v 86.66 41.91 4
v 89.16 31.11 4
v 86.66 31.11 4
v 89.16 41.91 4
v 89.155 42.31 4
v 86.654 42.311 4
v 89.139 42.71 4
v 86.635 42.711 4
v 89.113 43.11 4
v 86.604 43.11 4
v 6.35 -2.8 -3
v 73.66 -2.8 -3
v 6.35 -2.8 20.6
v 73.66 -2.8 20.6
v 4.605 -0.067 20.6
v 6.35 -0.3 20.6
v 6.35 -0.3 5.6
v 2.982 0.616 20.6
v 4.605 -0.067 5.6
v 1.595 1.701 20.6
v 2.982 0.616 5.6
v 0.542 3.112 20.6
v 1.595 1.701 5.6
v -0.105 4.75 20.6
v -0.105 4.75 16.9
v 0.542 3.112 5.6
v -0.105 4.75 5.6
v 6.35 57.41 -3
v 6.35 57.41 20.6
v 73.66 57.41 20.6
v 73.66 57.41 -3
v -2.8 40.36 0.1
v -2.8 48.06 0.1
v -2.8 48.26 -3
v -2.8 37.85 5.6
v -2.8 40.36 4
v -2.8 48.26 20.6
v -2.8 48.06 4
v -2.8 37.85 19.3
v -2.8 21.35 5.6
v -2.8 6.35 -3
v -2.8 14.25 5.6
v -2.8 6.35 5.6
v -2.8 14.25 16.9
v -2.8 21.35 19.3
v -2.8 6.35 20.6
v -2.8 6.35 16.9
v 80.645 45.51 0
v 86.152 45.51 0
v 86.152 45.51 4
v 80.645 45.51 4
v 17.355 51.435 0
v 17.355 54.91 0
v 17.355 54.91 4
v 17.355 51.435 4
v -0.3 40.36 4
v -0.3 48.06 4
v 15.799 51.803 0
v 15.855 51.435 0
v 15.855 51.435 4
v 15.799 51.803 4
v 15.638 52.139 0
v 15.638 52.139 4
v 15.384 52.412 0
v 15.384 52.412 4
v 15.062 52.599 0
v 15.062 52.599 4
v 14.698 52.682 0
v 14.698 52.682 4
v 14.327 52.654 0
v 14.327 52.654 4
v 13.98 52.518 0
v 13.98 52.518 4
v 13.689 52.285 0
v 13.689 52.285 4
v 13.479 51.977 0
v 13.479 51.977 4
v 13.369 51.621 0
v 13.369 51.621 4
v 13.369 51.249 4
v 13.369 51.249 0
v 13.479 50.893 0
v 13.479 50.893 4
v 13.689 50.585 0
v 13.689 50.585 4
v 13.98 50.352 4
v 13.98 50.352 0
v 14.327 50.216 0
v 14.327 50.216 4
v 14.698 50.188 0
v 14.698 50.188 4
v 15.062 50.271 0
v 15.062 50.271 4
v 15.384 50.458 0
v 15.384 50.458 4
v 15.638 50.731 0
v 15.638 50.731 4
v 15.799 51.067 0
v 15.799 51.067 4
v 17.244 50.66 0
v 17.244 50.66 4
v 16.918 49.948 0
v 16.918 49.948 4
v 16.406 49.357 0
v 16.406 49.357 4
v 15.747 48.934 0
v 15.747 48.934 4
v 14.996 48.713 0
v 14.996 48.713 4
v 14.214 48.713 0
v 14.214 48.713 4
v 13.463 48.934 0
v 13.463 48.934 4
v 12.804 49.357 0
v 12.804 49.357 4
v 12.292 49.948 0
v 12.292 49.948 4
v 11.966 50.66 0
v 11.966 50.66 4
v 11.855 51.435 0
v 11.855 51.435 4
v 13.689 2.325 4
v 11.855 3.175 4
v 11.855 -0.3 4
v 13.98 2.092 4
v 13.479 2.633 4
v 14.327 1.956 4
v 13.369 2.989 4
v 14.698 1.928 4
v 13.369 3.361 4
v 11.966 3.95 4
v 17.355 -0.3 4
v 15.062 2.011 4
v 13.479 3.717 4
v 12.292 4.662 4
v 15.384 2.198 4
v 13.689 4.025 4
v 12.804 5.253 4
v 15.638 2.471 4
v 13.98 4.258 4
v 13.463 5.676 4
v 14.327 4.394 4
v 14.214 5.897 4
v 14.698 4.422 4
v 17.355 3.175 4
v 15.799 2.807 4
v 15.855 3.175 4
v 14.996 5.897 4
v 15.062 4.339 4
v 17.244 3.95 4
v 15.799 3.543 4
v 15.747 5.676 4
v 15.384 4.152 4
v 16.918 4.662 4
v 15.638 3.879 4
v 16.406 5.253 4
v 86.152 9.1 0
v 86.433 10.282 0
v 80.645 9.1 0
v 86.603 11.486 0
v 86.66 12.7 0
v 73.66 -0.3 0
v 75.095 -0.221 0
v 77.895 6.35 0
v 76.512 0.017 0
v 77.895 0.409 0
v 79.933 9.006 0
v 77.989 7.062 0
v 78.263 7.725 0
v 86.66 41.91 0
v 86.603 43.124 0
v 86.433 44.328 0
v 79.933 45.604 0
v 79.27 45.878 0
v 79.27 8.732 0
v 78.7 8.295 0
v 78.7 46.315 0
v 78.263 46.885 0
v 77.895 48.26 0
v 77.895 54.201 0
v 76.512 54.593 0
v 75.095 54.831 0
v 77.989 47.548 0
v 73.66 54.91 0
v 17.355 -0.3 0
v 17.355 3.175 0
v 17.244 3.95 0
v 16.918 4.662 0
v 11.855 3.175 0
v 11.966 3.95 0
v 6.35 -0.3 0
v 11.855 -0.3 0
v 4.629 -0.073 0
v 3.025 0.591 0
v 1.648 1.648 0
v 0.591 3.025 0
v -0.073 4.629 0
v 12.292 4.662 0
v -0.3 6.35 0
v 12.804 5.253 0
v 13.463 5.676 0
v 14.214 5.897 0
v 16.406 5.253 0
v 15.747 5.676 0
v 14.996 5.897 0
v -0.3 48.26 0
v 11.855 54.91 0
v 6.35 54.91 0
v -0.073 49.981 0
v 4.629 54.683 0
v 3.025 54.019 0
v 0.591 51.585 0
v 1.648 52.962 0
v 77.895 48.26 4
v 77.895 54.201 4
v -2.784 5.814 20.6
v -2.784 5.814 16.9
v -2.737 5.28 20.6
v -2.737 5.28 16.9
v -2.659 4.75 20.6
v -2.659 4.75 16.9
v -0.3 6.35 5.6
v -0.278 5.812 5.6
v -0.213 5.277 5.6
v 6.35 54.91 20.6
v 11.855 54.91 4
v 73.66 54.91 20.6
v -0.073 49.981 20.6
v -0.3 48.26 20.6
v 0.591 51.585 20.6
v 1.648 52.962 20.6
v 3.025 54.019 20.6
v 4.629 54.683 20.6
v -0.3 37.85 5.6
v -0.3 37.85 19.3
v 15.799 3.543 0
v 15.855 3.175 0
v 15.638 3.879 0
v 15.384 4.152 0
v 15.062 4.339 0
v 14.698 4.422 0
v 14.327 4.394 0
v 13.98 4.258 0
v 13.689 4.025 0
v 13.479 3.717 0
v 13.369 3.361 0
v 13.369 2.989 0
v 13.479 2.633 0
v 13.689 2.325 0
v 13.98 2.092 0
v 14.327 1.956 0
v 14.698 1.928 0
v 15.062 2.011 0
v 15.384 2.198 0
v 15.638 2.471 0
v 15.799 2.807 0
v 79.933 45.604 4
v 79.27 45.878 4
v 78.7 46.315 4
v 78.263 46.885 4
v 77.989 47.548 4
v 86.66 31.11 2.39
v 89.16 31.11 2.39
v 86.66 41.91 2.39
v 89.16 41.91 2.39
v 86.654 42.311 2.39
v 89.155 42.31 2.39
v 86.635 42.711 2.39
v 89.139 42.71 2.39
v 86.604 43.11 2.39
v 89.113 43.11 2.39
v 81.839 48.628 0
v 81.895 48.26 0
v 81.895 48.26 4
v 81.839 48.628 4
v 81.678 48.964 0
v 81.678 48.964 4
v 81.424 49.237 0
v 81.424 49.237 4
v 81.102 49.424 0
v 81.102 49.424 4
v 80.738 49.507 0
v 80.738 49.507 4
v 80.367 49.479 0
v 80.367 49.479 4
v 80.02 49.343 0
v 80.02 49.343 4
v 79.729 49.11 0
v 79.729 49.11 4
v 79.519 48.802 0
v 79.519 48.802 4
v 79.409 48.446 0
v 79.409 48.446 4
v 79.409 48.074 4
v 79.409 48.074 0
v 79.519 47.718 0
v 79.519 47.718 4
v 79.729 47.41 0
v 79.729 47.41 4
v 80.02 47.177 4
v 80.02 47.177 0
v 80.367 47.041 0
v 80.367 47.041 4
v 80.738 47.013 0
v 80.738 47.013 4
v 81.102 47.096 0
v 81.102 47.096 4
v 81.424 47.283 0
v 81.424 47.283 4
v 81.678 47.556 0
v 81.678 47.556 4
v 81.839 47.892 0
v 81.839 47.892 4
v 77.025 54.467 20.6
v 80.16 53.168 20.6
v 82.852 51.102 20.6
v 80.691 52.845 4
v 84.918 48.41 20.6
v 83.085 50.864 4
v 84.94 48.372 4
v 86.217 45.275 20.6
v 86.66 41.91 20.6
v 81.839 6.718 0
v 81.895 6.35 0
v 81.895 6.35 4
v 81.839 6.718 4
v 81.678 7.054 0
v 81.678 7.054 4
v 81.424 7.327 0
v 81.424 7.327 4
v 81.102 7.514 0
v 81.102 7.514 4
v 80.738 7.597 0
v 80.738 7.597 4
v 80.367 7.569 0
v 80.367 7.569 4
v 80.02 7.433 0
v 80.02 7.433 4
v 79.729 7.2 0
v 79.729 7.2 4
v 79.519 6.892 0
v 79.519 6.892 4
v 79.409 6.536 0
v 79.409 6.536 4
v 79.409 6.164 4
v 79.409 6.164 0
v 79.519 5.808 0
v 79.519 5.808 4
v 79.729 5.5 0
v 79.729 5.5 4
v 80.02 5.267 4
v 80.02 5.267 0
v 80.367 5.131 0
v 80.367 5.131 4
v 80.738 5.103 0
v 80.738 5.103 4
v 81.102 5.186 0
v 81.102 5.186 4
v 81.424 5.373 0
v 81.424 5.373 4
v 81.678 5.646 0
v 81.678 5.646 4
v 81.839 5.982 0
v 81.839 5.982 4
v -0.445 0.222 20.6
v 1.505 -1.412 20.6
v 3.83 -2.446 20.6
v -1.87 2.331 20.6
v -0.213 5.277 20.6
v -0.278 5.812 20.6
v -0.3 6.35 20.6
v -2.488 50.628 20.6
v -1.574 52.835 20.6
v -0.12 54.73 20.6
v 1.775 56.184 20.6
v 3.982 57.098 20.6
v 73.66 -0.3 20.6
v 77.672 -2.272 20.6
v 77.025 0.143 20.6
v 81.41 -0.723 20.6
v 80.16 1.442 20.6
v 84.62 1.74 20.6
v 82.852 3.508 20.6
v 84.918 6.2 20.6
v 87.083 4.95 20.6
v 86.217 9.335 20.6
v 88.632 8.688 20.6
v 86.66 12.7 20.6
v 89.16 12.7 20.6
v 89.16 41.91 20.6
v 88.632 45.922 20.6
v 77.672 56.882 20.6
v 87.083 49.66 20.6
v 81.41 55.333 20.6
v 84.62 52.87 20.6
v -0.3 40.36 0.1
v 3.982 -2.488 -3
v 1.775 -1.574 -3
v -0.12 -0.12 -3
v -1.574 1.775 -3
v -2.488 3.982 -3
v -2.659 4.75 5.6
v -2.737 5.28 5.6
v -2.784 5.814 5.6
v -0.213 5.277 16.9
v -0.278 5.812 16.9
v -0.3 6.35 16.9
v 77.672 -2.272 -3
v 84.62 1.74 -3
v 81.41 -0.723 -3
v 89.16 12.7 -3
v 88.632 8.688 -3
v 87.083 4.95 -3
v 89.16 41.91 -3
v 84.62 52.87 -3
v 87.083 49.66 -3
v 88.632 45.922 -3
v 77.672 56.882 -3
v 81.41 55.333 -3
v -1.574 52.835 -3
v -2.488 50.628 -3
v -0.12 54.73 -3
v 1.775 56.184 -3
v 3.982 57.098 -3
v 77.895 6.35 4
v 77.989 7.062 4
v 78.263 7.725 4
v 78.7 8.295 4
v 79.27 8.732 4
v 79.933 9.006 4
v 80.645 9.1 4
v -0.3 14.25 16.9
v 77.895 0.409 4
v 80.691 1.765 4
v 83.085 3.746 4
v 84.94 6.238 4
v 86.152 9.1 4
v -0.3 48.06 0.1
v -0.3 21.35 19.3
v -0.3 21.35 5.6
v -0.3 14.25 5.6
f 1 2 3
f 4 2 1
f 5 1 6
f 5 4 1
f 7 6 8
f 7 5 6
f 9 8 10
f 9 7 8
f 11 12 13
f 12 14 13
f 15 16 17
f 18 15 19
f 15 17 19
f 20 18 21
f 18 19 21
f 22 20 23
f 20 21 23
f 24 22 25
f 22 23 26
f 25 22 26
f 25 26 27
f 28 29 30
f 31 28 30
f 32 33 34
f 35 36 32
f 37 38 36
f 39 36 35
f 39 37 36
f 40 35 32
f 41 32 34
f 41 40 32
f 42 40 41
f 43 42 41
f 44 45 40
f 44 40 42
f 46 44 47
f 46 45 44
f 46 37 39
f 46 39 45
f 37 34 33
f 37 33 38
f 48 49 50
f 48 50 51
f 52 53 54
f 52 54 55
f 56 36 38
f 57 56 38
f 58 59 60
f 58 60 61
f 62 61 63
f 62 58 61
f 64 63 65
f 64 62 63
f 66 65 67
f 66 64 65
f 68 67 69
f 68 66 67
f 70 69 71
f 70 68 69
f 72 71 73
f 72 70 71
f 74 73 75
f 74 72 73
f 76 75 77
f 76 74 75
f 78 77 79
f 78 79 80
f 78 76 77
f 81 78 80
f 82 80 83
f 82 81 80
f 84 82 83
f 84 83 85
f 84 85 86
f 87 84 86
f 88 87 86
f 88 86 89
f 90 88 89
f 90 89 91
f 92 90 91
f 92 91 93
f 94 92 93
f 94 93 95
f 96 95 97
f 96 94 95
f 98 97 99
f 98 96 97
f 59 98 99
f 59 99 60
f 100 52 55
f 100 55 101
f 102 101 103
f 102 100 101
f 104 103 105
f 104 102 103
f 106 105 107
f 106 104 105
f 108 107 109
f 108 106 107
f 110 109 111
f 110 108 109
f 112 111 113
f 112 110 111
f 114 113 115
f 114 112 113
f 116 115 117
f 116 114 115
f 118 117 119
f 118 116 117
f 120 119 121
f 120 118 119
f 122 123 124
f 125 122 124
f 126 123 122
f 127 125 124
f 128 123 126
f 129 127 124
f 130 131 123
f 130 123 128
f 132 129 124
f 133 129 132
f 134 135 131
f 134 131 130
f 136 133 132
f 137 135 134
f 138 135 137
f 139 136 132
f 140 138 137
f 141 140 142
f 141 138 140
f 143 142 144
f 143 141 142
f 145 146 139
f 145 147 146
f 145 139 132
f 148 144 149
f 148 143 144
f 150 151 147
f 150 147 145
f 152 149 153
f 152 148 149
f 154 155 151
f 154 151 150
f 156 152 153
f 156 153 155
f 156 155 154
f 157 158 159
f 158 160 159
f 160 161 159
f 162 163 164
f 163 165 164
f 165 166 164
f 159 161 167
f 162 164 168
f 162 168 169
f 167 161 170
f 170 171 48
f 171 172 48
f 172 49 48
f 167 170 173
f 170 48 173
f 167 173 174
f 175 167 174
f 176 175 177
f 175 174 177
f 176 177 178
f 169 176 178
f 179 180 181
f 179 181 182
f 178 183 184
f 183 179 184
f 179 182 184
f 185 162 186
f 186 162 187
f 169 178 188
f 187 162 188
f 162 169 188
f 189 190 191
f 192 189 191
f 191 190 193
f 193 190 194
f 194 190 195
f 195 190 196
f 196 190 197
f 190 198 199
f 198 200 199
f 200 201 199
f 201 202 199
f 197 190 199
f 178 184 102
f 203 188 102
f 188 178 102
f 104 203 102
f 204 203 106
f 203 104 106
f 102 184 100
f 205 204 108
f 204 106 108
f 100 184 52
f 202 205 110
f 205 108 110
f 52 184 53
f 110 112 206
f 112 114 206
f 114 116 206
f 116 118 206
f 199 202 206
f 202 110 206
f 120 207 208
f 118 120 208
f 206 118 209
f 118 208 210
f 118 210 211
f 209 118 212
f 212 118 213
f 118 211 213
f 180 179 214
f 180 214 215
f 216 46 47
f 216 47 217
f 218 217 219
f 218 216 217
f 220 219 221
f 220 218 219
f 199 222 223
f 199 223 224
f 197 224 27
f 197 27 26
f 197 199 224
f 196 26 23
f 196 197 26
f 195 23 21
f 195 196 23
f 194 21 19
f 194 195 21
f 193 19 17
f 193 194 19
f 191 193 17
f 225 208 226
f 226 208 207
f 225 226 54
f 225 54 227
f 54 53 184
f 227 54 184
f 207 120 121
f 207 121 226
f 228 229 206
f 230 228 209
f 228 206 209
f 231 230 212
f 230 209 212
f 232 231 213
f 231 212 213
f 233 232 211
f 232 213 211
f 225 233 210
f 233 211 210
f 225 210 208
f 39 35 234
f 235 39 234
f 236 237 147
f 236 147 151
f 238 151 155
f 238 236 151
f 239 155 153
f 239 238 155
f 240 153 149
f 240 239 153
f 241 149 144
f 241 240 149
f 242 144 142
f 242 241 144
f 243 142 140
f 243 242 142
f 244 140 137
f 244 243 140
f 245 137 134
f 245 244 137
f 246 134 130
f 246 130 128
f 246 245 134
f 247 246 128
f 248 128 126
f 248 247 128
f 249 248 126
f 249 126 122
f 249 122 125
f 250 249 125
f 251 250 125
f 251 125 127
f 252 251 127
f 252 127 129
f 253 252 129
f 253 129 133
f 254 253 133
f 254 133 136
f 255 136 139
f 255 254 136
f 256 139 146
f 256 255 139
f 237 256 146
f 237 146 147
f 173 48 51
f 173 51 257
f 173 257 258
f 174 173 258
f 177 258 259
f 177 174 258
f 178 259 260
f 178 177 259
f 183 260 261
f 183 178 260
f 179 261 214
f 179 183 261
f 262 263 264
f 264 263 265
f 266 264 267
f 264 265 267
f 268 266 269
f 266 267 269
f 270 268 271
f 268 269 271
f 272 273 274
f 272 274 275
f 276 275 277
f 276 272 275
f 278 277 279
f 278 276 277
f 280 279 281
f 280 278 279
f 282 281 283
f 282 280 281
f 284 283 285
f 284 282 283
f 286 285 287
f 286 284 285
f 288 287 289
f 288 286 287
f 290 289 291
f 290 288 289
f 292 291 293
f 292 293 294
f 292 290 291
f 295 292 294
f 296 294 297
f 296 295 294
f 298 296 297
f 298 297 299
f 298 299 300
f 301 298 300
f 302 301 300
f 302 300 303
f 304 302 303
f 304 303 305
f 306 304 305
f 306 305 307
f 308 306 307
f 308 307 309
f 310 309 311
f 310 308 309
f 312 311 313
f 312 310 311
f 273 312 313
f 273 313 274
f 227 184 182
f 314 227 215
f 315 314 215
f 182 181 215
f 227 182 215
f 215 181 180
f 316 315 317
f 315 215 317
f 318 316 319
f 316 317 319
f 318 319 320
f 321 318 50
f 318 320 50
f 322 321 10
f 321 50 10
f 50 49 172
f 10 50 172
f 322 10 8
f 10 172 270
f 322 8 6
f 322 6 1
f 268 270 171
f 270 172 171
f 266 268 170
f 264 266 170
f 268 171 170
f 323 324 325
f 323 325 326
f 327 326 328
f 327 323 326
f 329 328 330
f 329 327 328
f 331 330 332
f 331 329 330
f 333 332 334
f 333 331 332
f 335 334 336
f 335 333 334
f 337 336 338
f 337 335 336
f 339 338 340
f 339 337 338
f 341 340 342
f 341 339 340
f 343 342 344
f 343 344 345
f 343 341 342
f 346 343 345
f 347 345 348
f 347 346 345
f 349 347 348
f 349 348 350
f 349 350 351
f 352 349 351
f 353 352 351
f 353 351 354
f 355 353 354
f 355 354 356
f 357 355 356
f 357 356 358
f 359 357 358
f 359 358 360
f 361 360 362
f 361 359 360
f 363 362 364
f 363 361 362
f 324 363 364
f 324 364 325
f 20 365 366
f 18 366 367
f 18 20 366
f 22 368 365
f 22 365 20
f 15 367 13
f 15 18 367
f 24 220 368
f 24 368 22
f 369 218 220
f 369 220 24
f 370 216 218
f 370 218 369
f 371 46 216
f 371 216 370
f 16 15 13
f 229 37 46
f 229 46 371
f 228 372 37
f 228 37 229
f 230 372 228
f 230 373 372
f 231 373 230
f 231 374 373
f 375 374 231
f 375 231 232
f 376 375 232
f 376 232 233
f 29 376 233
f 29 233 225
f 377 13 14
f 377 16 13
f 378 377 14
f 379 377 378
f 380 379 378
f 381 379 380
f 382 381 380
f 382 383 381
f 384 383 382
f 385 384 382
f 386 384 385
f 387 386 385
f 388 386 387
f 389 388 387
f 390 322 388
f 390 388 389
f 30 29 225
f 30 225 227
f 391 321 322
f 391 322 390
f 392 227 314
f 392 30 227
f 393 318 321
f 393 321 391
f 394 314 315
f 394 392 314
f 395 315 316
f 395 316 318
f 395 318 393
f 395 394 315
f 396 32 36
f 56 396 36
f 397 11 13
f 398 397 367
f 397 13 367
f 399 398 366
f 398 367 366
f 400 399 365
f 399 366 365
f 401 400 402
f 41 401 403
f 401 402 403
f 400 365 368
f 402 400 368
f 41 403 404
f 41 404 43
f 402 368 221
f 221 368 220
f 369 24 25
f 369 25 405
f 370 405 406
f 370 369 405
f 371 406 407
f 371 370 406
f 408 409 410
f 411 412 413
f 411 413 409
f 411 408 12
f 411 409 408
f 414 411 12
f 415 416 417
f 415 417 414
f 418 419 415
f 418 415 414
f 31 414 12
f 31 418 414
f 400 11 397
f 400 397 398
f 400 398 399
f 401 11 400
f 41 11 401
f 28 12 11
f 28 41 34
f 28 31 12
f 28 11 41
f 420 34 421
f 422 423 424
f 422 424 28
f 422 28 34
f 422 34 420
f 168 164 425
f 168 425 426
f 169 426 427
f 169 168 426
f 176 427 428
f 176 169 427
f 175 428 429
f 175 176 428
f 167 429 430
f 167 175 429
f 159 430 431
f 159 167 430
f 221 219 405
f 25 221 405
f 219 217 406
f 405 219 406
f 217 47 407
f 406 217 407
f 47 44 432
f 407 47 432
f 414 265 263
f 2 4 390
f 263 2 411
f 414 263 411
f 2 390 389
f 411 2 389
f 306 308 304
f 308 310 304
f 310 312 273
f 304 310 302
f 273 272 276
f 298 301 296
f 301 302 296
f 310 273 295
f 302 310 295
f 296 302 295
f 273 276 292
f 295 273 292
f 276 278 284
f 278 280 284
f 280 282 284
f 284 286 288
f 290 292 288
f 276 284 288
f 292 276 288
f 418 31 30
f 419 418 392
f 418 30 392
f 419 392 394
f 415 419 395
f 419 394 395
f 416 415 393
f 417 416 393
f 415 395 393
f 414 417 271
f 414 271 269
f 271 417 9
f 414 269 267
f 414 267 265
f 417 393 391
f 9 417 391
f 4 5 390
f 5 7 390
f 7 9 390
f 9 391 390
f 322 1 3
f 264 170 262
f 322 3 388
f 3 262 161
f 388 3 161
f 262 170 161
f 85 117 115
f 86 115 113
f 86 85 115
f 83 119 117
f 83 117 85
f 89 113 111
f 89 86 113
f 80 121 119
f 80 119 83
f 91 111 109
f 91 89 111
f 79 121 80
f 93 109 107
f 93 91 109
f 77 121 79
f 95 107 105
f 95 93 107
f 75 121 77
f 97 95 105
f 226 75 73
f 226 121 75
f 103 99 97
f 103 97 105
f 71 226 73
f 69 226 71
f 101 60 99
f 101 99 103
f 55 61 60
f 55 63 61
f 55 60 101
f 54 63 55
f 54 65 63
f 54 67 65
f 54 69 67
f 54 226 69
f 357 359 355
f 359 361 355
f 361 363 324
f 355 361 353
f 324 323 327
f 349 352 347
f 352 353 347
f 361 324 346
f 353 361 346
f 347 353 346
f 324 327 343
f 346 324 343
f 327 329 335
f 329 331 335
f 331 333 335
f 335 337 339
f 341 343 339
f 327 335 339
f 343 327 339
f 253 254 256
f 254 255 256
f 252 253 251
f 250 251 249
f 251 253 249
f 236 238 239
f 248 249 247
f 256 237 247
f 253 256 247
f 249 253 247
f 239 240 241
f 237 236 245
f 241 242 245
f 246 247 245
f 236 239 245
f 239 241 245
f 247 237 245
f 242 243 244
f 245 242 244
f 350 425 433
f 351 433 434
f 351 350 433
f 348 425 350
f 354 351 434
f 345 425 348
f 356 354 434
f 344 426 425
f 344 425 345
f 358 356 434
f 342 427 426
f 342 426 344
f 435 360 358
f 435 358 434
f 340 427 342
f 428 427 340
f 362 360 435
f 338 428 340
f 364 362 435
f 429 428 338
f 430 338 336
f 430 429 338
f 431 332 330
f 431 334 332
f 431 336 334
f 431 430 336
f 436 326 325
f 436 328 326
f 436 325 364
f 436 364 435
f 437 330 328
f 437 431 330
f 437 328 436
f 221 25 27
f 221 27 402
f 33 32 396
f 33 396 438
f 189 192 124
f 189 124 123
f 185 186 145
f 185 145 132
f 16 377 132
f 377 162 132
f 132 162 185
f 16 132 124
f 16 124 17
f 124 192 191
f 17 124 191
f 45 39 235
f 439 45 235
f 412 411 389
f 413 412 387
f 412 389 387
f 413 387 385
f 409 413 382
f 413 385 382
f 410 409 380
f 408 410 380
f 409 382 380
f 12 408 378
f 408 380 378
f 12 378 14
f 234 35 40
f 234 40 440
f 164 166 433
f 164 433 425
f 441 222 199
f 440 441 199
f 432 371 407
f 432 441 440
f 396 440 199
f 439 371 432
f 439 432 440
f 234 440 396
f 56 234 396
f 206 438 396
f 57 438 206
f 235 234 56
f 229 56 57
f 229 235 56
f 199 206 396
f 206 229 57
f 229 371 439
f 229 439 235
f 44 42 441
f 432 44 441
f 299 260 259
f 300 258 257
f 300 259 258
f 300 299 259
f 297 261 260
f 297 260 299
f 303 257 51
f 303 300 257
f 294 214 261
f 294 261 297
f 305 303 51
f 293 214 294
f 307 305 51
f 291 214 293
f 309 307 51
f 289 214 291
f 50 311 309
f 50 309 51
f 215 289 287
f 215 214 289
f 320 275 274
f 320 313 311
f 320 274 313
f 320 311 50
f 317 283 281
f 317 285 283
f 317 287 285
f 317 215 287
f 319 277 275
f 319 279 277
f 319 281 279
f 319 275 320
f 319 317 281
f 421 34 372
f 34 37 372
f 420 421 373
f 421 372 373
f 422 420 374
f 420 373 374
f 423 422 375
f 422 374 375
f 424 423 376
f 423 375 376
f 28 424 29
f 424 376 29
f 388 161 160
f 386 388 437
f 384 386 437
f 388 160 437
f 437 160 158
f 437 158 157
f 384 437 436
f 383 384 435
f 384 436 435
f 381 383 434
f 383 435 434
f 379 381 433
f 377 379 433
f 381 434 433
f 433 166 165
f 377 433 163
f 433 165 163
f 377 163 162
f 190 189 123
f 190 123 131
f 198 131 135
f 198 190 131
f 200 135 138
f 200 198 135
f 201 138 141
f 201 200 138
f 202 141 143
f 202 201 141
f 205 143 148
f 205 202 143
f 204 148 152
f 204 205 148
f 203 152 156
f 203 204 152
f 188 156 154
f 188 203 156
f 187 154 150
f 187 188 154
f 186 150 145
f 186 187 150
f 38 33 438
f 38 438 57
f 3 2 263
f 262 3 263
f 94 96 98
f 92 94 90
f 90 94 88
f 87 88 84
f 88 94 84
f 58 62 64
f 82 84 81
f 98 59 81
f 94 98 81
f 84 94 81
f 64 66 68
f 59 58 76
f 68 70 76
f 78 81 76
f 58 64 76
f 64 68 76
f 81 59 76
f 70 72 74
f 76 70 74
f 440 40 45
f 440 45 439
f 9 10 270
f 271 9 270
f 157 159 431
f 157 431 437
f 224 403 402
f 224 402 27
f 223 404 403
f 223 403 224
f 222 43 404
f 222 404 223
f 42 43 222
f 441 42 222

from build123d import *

# Parameters (mm, degrees)
SKETCH5_R                    = 1.25
BOTTOM_FRAME_DEPTH           = 4
PCB_DEPTH                    = 1.6
SKETCH7_W                    = 2.5
SKETCH7_H                    = 7.1
UPPER_FRAME_DEPTH            = 15
BOTTOM_DEPTH                 = 3
SKETCH9_W                    = 2.5
SKETCH9_H                    = 16.5
NETWORK_CONNECTOR_BOSS_DEPTH = 1.3
BOSS_EXTRUDE8_DEPTH          = 3.7
MINI_USB_REACH               = 93.96
SKETCH11_W                   = 3.9
SKETCH11_H                   = 7.7
CUT_EXTRUDE3_REACH           = 93.96
SKETCH12_W                   = 1.61
SKETCH12_H                   = 12


with BuildPart() as part:
    # Sketch5 → Bottom frame (new body)
    with BuildSketch(Plane.XY):
        with BuildLine():
            Line((73.66, 57.41), (6.35, 57.41))
            ThreePointArc((6.35, 57.41), (-0.120027048, 54.730027048), (-2.8, 48.26))
            Line((-2.8, 48.26), (-2.8, 6.35))
            ThreePointArc((-2.8, 6.35), (-0.120027048, -0.120027048), (6.35, -2.8))
            Line((6.35, -2.8), (73.66, -2.8))
            ThreePointArc((73.66, -2.8), (84.620155108, 1.739844892), (89.16, 12.7))
            Line((89.16, 12.7), (89.16, 41.91))
            ThreePointArc((89.16, 41.91), (84.620155108, 52.870155108), (73.66, 57.41))
        make_face()
        with Locations((14.605, 51.435)):
            Circle(SKETCH5_R, mode=Mode.SUBTRACT)
        with Locations((80.645, 48.26)):
            Circle(SKETCH5_R, mode=Mode.SUBTRACT)
        with Locations((80.645, 6.35)):
            Circle(SKETCH5_R, mode=Mode.SUBTRACT)
        with Locations((14.605, 3.175)):
            Circle(SKETCH5_R, mode=Mode.SUBTRACT)
        with BuildLine():
            Line((73.66, 54.91), (17.355, 54.91))
            Line((17.355, 54.91), (17.355, 51.435))
            ThreePointArc((17.355, 51.435), (14.605, 48.685), (11.855, 51.435))
            Line((11.855, 51.435), (11.855, 54.91))
            Line((11.855, 54.91), (6.35, 54.91))
            ThreePointArc((6.35, 54.91), (1.647739905, 52.962260095), (-0.3, 48.26))
            Line((-0.3, 48.26), (-0.3, 6.35))
            ThreePointArc((-0.3, 6.35), (1.647739905, 1.647739905), (6.35, -0.3))
            Line((6.35, -0.3), (11.855, -0.3))
            Line((11.855, -0.3), (11.855, 3.175))
            ThreePointArc((11.855, 3.175), (14.605, 5.925), (17.355, 3.175))
            Line((17.355, 3.175), (17.355, -0.3))
            Line((17.355, -0.3), (73.66, -0.3))
            ThreePointArc((73.66, -0.3), (75.806982263, -0.121484593), (77.895, 0.409158898))
            Line((77.895, 0.409158898), (77.895, 6.35))
            ThreePointArc((77.895, 6.35), (78.700456352, 8.294543648), (80.645, 9.1))
            Line((80.645, 9.1), (86.151597176, 9.1))
            ThreePointArc((86.151597176, 9.1), (86.532271814, 10.882139071), (86.66, 12.7))
            Line((86.66, 12.7), (86.66, 41.91))
            ThreePointArc((86.66, 41.91), (86.532271814, 43.727860929), (86.151597176, 45.51))
            Line((86.151597176, 45.51), (80.645, 45.51))
            ThreePointArc((80.645, 45.51), (78.700456352, 46.315456352), (77.895, 48.26))
            Line((77.895, 48.26), (77.895, 54.200841102))
            ThreePointArc((77.895, 54.200841102), (75.806982263, 54.731484593), (73.66, 54.91))
        make_face(mode=Mode.SUBTRACT)
    extrude(amount=BOTTOM_FRAME_DEPTH)

    # Sketch6 → PCB (add)
    with BuildSketch(Plane.XY.offset(4)):
        with BuildLine():
            Line((73.66, 57.41), (6.35, 57.41))
            ThreePointArc((6.35, 57.41), (-0.120027048, 54.730027048), (-2.8, 48.26))
            Line((-2.8, 48.26), (-2.8, 6.35))
            ThreePointArc((-2.8, 6.35), (-0.120027048, -0.120027048), (6.35, -2.8))
            Line((6.35, -2.8), (73.66, -2.8))
            ThreePointArc((73.66, -2.8), (84.620155108, 1.739844892), (89.16, 12.7))
            Line((89.16, 12.7), (89.16, 41.91))
            ThreePointArc((89.16, 41.91), (84.620155108, 52.870155108), (73.66, 57.41))
        make_face()
        with BuildLine():
            Line((-0.3, 48.26), (-0.3, 6.35))
            ThreePointArc((-0.3, 6.35), (1.647739905, 1.647739905), (6.35, -0.3))
            Line((6.35, -0.3), (73.66, -0.3))
            ThreePointArc((73.66, -0.3), (82.852388155, 3.507611845), (86.66, 12.7))
            Line((86.66, 12.7), (86.66, 41.91))
            ThreePointArc((86.66, 41.91), (82.852388155, 51.102388155), (73.66, 54.91))
            Line((73.66, 54.91), (6.35, 54.91))
            ThreePointArc((6.35, 54.91), (1.647739905, 52.962260095), (-0.3, 48.26))
        make_face(mode=Mode.SUBTRACT)
    extrude(amount=PCB_DEPTH)

    # Sketch7 → upper frame (add)
    with BuildSketch(Plane.XY.offset(5.6)):
        with BuildLine():
            Line((6.35, 54.91), (73.66, 54.91))
            ThreePointArc((73.66, 54.91), (82.852388155, 51.102388155), (86.66, 41.91))
            Line((86.66, 41.91), (86.66, 12.7))
            ThreePointArc((86.66, 12.7), (82.852388155, 3.507611845), (73.66, -0.3))
            Line((73.66, -0.3), (6.35, -0.3))
            ThreePointArc((6.35, -0.3), (2.252287223, 1.112514916), (-0.104649487, 4.75))
            Line((-0.104649487, 4.75), (-2.659023254, 4.75))
            ThreePointArc((-2.659023254, 4.75), (0.472819554, -0.662934479), (6.35, -2.8))
            Line((6.35, -2.8), (73.66, -2.8))
            ThreePointArc((73.66, -2.8), (84.620155108, 1.739844892), (89.16, 12.7))
            Line((89.16, 12.7), (89.16, 41.91))
            ThreePointArc((89.16, 41.91), (84.620155108, 52.870155108), (73.66, 57.41))
            Line((73.66, 57.41), (6.35, 57.41))
            ThreePointArc((6.35, 57.41), (-0.120027048, 54.730027048), (-2.8, 48.26))
            Line((-2.8, 48.26), (-2.8, 37.85))
            Line((-2.8, 37.85), (-0.3, 37.85))
            Line((-0.3, 37.85), (-0.3, 48.26))
            ThreePointArc((-0.3, 48.26), (1.647739905, 52.962260095), (6.35, 54.91))
        make_face()
        with Locations((-1.55, 17.8)):
            Rectangle(SKETCH7_W, SKETCH7_H)
    extrude(amount=UPPER_FRAME_DEPTH)

    # Sketch8 → bottom (add)
    with BuildSketch(Plane(origin=(0, 0, 0), x_dir=(-1, 0, 0), z_dir=(0, 0, -1))):
        with BuildLine():
            Line((-89.16, 41.91), (-89.16, 12.7))
            ThreePointArc((-89.16, 12.7), (-84.620155108, 1.739844892), (-73.66, -2.8))
            Line((-73.66, -2.8), (-6.35, -2.8))
            ThreePointArc((-6.35, -2.8), (0.120027048, -0.120027048), (2.8, 6.35))
            Line((2.8, 6.35), (2.8, 48.26))
            ThreePointArc((2.8, 48.26), (0.120027048, 54.730027048), (-6.35, 57.41))
            Line((-6.35, 57.41), (-73.66, 57.41))
            ThreePointArc((-73.66, 57.41), (-84.620155108, 52.870155108), (-89.16, 41.91))
        make_face()
    extrude(amount=BOTTOM_DEPTH)

    # Sketch9 → network connector boss (add)
    with BuildSketch(Plane.XY.offset(20.6)):
        with Locations((-1.55, 29.6)):
            Rectangle(SKETCH9_W, SKETCH9_H)
    extrude(amount=-NETWORK_CONNECTOR_BOSS_DEPTH)

    # Sketch10 → Boss-Extrude8 (add)
    with BuildSketch(Plane.XY.offset(20.6)):
        with BuildLine():
            Line((-0.3, 14.25), (-2.8, 14.25))
            Line((-2.8, 14.25), (-2.8, 6.35))
            ThreePointArc((-2.8, 6.35), (-2.764687674, 5.546900622), (-2.659023254, 4.75))
            Line((-2.659023254, 4.75), (-0.104649487, 4.75))
            ThreePointArc((-0.104649487, 4.75), (-0.250981711, 5.544059273), (-0.3, 6.35))
            Line((-0.3, 6.35), (-0.3, 14.25))
        make_face()
    extrude(amount=-BOSS_EXTRUDE8_DEPTH)

    # Sketch11 → mini-USB (cut, up to next)
    with BuildSketch(Plane.ZY.offset(2.8), mode=Mode.PRIVATE) as mini_usb_sk1:
        with Locations((2.05, 44.21)):
            Rectangle(SKETCH11_W, SKETCH11_H)
    mini_usb_tool1 = extrude(mini_usb_sk1.sketch, amount=-MINI_USB_REACH, mode=Mode.PRIVATE) & part.part
    add(mini_usb_tool1.solids().sort_by_distance((-2.8, 44.21, 2.05))[0], mode=Mode.SUBTRACT)

    # Sketch12 → Cut-Extrude3 (cut, up to next)
    with BuildSketch(Plane(origin=(89.16, 0, 0), x_dir=(0, 0, -1), z_dir=(1, 0, 0)), mode=Mode.PRIVATE) as cut_extrude3_sk1:
        with Locations((-3.195, 37.11)):
            Rectangle(SKETCH12_W, SKETCH12_H)
    cut_extrude3_tool1 = extrude(cut_extrude3_sk1.sketch, amount=-CUT_EXTRUDE3_REACH, mode=Mode.PRIVATE) & part.part
    add(cut_extrude3_tool1.solids().sort_by_distance((89.16, 37.11, 3.195))[0], mode=Mode.SUBTRACT)


solid = part.part
